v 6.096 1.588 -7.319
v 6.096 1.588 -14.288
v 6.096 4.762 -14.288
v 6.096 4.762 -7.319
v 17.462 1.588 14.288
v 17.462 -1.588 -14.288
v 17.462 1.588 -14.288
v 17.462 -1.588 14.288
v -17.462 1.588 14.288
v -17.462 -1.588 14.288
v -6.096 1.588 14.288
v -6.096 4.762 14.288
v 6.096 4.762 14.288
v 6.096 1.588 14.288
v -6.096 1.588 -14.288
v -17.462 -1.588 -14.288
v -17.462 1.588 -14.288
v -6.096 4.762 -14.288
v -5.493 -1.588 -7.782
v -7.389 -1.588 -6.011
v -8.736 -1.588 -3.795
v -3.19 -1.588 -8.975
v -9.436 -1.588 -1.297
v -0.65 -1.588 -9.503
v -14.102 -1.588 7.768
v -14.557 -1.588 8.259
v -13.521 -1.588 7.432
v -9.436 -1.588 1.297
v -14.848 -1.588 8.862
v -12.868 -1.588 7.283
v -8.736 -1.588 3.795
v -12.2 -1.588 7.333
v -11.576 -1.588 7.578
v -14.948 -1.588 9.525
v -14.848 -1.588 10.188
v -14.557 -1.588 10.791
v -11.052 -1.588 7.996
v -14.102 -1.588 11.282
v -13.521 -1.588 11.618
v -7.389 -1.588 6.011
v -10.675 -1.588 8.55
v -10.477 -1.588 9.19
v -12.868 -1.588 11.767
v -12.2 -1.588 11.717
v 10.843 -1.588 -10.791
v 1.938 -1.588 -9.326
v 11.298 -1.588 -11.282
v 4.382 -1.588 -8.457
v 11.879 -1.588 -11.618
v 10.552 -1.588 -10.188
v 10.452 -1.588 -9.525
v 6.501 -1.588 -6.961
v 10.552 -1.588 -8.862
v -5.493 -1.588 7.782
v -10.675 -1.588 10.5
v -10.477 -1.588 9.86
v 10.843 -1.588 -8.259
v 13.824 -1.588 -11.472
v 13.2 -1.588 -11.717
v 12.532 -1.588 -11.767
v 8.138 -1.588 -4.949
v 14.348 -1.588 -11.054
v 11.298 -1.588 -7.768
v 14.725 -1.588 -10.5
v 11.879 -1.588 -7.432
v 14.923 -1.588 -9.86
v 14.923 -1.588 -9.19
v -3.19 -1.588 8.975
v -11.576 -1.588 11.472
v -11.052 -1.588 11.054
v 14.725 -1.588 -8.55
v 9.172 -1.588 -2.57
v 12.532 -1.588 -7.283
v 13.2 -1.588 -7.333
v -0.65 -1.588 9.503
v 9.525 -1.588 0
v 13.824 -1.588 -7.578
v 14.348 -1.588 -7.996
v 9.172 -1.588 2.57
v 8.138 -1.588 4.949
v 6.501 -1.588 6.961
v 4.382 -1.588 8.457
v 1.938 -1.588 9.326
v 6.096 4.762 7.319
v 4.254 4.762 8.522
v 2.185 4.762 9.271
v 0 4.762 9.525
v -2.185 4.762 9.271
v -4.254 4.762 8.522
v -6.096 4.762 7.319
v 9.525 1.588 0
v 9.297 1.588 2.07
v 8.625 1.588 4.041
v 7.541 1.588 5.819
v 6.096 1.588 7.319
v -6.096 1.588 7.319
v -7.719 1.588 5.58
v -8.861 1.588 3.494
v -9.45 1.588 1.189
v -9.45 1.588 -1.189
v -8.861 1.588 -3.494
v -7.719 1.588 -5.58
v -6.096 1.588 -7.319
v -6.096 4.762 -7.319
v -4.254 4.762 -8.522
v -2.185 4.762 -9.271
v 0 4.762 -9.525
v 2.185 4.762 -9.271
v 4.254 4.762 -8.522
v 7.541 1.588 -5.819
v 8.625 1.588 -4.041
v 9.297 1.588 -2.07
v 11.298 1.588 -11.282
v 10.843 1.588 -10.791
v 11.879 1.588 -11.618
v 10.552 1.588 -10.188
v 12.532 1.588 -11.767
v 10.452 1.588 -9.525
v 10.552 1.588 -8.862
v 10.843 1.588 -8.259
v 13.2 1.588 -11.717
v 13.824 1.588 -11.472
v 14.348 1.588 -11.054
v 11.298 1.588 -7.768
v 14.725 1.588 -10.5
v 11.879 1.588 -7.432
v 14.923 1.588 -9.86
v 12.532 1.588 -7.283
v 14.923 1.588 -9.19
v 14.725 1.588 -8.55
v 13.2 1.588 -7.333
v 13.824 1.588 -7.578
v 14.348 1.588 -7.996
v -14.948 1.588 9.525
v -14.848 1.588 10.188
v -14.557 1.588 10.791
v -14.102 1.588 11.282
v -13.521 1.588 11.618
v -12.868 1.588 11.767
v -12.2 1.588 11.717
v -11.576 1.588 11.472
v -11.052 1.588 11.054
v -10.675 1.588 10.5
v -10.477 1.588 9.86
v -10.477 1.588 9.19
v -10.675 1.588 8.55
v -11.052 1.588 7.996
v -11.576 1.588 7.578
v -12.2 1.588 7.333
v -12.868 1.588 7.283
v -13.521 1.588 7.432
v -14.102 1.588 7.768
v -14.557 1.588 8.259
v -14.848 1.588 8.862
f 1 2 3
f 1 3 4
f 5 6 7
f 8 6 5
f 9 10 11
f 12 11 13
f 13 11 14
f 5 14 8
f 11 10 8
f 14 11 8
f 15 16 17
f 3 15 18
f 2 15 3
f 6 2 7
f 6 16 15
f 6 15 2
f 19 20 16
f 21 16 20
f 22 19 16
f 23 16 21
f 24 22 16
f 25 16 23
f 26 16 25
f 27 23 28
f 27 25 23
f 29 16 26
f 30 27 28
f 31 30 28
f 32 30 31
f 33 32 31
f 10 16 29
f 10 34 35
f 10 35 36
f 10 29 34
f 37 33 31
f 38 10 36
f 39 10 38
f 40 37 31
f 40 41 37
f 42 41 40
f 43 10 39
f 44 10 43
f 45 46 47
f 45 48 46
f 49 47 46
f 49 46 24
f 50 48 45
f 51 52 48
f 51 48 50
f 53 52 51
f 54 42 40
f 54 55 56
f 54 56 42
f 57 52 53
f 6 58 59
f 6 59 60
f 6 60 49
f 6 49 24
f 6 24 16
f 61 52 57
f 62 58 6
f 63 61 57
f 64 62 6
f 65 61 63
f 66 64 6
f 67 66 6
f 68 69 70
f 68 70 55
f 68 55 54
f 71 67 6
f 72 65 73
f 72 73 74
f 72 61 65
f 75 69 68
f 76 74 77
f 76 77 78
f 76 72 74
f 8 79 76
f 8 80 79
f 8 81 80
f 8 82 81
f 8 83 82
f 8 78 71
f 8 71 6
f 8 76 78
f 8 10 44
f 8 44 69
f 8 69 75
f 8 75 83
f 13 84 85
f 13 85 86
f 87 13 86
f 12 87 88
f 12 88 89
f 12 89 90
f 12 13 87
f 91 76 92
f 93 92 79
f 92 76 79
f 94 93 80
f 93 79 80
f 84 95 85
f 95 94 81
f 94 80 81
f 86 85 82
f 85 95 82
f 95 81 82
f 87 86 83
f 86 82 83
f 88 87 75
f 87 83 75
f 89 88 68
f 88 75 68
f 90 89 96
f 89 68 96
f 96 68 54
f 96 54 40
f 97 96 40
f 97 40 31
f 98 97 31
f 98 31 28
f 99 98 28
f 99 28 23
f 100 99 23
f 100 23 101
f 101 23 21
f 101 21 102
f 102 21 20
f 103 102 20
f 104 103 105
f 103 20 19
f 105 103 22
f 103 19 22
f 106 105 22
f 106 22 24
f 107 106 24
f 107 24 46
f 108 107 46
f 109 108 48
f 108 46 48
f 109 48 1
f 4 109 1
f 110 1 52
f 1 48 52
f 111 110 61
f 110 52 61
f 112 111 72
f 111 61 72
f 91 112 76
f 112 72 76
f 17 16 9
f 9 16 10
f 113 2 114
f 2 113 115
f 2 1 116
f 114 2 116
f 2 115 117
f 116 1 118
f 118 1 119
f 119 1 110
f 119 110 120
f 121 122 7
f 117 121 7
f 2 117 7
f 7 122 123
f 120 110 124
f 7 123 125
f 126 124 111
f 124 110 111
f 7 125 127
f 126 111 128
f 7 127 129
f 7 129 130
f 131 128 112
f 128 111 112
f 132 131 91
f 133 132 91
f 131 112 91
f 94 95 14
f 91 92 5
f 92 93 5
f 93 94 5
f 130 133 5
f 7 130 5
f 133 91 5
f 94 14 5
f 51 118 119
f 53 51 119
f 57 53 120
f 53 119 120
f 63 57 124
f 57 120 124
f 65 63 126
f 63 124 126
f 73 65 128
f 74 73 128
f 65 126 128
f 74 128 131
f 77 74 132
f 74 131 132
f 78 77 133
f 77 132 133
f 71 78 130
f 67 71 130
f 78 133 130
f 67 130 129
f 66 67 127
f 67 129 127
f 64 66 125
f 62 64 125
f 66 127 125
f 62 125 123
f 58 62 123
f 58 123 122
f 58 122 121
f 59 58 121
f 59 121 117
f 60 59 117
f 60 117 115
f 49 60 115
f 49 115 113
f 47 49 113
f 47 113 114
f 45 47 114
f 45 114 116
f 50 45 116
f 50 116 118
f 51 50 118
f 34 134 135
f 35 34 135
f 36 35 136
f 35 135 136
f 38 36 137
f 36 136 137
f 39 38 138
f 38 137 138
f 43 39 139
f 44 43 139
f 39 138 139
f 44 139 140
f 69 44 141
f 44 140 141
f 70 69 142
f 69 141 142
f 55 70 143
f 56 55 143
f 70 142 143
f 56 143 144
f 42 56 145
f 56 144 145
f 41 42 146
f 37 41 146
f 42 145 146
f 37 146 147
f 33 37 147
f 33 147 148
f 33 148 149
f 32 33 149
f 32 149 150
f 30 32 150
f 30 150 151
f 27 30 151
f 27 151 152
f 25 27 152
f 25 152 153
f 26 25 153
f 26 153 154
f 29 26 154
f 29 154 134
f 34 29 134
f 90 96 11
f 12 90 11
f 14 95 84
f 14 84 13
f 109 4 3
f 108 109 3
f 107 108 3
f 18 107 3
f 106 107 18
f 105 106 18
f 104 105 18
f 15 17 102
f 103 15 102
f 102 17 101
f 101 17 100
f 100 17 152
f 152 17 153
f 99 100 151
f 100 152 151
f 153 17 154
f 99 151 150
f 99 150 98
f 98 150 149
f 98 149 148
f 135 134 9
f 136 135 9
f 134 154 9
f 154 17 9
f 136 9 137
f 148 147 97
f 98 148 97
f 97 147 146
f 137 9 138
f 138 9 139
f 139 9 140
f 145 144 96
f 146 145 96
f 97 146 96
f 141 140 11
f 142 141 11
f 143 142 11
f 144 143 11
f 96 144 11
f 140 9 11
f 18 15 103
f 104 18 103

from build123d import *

# Parameters (mm, degrees)
F0_W     = 34.925
F0_H     = 28.575
F1_DEPTH = 1.5875
F3_D     = 4.4958
F3_DEPTH = 12.7
F3_TIP   = 1.3506745855
F4_W     = 12.192
F4_H     = 28.575
F5_DEPTH = 3.175
F6_R     = 9.525
F7_DEPTH = 6.351


with BuildPart() as f1:
    # F0 (on Front) → F1 (new body, symmetric)
    with BuildSketch(Plane.XZ):
        Rectangle(F0_W, F0_H)
    extrude(amount=F1_DEPTH, both=True)

    # F3
    with Locations(Plane.XZ.offset(1.5875)):
        with Locations((-12.7, 9.525), (12.7, -9.525)):
            Hole(F3_D / 2, depth=F3_DEPTH)
            with Locations((0, 0, -(F3_DEPTH + F3_TIP / 2))):  # 118° drill point
                Cone(0, F3_D / 2, F3_TIP, mode=Mode.SUBTRACT)

    # F4 (on face) → F5 (join)
    with BuildSketch(Plane(origin=(0, 1.5875, 0), x_dir=(-1, 0, 0), z_dir=(0, 1, 0))):
        Rectangle(F4_W, F4_H)
    extrude(amount=F5_DEPTH)

    # F6 (on face) → F7 (cut, through all)
    with BuildSketch(Plane.XZ.offset(1.5875)):
        Circle(F6_R)
    extrude(amount=-F7_DEPTH, mode=Mode.SUBTRACT)


solid = f1.part
